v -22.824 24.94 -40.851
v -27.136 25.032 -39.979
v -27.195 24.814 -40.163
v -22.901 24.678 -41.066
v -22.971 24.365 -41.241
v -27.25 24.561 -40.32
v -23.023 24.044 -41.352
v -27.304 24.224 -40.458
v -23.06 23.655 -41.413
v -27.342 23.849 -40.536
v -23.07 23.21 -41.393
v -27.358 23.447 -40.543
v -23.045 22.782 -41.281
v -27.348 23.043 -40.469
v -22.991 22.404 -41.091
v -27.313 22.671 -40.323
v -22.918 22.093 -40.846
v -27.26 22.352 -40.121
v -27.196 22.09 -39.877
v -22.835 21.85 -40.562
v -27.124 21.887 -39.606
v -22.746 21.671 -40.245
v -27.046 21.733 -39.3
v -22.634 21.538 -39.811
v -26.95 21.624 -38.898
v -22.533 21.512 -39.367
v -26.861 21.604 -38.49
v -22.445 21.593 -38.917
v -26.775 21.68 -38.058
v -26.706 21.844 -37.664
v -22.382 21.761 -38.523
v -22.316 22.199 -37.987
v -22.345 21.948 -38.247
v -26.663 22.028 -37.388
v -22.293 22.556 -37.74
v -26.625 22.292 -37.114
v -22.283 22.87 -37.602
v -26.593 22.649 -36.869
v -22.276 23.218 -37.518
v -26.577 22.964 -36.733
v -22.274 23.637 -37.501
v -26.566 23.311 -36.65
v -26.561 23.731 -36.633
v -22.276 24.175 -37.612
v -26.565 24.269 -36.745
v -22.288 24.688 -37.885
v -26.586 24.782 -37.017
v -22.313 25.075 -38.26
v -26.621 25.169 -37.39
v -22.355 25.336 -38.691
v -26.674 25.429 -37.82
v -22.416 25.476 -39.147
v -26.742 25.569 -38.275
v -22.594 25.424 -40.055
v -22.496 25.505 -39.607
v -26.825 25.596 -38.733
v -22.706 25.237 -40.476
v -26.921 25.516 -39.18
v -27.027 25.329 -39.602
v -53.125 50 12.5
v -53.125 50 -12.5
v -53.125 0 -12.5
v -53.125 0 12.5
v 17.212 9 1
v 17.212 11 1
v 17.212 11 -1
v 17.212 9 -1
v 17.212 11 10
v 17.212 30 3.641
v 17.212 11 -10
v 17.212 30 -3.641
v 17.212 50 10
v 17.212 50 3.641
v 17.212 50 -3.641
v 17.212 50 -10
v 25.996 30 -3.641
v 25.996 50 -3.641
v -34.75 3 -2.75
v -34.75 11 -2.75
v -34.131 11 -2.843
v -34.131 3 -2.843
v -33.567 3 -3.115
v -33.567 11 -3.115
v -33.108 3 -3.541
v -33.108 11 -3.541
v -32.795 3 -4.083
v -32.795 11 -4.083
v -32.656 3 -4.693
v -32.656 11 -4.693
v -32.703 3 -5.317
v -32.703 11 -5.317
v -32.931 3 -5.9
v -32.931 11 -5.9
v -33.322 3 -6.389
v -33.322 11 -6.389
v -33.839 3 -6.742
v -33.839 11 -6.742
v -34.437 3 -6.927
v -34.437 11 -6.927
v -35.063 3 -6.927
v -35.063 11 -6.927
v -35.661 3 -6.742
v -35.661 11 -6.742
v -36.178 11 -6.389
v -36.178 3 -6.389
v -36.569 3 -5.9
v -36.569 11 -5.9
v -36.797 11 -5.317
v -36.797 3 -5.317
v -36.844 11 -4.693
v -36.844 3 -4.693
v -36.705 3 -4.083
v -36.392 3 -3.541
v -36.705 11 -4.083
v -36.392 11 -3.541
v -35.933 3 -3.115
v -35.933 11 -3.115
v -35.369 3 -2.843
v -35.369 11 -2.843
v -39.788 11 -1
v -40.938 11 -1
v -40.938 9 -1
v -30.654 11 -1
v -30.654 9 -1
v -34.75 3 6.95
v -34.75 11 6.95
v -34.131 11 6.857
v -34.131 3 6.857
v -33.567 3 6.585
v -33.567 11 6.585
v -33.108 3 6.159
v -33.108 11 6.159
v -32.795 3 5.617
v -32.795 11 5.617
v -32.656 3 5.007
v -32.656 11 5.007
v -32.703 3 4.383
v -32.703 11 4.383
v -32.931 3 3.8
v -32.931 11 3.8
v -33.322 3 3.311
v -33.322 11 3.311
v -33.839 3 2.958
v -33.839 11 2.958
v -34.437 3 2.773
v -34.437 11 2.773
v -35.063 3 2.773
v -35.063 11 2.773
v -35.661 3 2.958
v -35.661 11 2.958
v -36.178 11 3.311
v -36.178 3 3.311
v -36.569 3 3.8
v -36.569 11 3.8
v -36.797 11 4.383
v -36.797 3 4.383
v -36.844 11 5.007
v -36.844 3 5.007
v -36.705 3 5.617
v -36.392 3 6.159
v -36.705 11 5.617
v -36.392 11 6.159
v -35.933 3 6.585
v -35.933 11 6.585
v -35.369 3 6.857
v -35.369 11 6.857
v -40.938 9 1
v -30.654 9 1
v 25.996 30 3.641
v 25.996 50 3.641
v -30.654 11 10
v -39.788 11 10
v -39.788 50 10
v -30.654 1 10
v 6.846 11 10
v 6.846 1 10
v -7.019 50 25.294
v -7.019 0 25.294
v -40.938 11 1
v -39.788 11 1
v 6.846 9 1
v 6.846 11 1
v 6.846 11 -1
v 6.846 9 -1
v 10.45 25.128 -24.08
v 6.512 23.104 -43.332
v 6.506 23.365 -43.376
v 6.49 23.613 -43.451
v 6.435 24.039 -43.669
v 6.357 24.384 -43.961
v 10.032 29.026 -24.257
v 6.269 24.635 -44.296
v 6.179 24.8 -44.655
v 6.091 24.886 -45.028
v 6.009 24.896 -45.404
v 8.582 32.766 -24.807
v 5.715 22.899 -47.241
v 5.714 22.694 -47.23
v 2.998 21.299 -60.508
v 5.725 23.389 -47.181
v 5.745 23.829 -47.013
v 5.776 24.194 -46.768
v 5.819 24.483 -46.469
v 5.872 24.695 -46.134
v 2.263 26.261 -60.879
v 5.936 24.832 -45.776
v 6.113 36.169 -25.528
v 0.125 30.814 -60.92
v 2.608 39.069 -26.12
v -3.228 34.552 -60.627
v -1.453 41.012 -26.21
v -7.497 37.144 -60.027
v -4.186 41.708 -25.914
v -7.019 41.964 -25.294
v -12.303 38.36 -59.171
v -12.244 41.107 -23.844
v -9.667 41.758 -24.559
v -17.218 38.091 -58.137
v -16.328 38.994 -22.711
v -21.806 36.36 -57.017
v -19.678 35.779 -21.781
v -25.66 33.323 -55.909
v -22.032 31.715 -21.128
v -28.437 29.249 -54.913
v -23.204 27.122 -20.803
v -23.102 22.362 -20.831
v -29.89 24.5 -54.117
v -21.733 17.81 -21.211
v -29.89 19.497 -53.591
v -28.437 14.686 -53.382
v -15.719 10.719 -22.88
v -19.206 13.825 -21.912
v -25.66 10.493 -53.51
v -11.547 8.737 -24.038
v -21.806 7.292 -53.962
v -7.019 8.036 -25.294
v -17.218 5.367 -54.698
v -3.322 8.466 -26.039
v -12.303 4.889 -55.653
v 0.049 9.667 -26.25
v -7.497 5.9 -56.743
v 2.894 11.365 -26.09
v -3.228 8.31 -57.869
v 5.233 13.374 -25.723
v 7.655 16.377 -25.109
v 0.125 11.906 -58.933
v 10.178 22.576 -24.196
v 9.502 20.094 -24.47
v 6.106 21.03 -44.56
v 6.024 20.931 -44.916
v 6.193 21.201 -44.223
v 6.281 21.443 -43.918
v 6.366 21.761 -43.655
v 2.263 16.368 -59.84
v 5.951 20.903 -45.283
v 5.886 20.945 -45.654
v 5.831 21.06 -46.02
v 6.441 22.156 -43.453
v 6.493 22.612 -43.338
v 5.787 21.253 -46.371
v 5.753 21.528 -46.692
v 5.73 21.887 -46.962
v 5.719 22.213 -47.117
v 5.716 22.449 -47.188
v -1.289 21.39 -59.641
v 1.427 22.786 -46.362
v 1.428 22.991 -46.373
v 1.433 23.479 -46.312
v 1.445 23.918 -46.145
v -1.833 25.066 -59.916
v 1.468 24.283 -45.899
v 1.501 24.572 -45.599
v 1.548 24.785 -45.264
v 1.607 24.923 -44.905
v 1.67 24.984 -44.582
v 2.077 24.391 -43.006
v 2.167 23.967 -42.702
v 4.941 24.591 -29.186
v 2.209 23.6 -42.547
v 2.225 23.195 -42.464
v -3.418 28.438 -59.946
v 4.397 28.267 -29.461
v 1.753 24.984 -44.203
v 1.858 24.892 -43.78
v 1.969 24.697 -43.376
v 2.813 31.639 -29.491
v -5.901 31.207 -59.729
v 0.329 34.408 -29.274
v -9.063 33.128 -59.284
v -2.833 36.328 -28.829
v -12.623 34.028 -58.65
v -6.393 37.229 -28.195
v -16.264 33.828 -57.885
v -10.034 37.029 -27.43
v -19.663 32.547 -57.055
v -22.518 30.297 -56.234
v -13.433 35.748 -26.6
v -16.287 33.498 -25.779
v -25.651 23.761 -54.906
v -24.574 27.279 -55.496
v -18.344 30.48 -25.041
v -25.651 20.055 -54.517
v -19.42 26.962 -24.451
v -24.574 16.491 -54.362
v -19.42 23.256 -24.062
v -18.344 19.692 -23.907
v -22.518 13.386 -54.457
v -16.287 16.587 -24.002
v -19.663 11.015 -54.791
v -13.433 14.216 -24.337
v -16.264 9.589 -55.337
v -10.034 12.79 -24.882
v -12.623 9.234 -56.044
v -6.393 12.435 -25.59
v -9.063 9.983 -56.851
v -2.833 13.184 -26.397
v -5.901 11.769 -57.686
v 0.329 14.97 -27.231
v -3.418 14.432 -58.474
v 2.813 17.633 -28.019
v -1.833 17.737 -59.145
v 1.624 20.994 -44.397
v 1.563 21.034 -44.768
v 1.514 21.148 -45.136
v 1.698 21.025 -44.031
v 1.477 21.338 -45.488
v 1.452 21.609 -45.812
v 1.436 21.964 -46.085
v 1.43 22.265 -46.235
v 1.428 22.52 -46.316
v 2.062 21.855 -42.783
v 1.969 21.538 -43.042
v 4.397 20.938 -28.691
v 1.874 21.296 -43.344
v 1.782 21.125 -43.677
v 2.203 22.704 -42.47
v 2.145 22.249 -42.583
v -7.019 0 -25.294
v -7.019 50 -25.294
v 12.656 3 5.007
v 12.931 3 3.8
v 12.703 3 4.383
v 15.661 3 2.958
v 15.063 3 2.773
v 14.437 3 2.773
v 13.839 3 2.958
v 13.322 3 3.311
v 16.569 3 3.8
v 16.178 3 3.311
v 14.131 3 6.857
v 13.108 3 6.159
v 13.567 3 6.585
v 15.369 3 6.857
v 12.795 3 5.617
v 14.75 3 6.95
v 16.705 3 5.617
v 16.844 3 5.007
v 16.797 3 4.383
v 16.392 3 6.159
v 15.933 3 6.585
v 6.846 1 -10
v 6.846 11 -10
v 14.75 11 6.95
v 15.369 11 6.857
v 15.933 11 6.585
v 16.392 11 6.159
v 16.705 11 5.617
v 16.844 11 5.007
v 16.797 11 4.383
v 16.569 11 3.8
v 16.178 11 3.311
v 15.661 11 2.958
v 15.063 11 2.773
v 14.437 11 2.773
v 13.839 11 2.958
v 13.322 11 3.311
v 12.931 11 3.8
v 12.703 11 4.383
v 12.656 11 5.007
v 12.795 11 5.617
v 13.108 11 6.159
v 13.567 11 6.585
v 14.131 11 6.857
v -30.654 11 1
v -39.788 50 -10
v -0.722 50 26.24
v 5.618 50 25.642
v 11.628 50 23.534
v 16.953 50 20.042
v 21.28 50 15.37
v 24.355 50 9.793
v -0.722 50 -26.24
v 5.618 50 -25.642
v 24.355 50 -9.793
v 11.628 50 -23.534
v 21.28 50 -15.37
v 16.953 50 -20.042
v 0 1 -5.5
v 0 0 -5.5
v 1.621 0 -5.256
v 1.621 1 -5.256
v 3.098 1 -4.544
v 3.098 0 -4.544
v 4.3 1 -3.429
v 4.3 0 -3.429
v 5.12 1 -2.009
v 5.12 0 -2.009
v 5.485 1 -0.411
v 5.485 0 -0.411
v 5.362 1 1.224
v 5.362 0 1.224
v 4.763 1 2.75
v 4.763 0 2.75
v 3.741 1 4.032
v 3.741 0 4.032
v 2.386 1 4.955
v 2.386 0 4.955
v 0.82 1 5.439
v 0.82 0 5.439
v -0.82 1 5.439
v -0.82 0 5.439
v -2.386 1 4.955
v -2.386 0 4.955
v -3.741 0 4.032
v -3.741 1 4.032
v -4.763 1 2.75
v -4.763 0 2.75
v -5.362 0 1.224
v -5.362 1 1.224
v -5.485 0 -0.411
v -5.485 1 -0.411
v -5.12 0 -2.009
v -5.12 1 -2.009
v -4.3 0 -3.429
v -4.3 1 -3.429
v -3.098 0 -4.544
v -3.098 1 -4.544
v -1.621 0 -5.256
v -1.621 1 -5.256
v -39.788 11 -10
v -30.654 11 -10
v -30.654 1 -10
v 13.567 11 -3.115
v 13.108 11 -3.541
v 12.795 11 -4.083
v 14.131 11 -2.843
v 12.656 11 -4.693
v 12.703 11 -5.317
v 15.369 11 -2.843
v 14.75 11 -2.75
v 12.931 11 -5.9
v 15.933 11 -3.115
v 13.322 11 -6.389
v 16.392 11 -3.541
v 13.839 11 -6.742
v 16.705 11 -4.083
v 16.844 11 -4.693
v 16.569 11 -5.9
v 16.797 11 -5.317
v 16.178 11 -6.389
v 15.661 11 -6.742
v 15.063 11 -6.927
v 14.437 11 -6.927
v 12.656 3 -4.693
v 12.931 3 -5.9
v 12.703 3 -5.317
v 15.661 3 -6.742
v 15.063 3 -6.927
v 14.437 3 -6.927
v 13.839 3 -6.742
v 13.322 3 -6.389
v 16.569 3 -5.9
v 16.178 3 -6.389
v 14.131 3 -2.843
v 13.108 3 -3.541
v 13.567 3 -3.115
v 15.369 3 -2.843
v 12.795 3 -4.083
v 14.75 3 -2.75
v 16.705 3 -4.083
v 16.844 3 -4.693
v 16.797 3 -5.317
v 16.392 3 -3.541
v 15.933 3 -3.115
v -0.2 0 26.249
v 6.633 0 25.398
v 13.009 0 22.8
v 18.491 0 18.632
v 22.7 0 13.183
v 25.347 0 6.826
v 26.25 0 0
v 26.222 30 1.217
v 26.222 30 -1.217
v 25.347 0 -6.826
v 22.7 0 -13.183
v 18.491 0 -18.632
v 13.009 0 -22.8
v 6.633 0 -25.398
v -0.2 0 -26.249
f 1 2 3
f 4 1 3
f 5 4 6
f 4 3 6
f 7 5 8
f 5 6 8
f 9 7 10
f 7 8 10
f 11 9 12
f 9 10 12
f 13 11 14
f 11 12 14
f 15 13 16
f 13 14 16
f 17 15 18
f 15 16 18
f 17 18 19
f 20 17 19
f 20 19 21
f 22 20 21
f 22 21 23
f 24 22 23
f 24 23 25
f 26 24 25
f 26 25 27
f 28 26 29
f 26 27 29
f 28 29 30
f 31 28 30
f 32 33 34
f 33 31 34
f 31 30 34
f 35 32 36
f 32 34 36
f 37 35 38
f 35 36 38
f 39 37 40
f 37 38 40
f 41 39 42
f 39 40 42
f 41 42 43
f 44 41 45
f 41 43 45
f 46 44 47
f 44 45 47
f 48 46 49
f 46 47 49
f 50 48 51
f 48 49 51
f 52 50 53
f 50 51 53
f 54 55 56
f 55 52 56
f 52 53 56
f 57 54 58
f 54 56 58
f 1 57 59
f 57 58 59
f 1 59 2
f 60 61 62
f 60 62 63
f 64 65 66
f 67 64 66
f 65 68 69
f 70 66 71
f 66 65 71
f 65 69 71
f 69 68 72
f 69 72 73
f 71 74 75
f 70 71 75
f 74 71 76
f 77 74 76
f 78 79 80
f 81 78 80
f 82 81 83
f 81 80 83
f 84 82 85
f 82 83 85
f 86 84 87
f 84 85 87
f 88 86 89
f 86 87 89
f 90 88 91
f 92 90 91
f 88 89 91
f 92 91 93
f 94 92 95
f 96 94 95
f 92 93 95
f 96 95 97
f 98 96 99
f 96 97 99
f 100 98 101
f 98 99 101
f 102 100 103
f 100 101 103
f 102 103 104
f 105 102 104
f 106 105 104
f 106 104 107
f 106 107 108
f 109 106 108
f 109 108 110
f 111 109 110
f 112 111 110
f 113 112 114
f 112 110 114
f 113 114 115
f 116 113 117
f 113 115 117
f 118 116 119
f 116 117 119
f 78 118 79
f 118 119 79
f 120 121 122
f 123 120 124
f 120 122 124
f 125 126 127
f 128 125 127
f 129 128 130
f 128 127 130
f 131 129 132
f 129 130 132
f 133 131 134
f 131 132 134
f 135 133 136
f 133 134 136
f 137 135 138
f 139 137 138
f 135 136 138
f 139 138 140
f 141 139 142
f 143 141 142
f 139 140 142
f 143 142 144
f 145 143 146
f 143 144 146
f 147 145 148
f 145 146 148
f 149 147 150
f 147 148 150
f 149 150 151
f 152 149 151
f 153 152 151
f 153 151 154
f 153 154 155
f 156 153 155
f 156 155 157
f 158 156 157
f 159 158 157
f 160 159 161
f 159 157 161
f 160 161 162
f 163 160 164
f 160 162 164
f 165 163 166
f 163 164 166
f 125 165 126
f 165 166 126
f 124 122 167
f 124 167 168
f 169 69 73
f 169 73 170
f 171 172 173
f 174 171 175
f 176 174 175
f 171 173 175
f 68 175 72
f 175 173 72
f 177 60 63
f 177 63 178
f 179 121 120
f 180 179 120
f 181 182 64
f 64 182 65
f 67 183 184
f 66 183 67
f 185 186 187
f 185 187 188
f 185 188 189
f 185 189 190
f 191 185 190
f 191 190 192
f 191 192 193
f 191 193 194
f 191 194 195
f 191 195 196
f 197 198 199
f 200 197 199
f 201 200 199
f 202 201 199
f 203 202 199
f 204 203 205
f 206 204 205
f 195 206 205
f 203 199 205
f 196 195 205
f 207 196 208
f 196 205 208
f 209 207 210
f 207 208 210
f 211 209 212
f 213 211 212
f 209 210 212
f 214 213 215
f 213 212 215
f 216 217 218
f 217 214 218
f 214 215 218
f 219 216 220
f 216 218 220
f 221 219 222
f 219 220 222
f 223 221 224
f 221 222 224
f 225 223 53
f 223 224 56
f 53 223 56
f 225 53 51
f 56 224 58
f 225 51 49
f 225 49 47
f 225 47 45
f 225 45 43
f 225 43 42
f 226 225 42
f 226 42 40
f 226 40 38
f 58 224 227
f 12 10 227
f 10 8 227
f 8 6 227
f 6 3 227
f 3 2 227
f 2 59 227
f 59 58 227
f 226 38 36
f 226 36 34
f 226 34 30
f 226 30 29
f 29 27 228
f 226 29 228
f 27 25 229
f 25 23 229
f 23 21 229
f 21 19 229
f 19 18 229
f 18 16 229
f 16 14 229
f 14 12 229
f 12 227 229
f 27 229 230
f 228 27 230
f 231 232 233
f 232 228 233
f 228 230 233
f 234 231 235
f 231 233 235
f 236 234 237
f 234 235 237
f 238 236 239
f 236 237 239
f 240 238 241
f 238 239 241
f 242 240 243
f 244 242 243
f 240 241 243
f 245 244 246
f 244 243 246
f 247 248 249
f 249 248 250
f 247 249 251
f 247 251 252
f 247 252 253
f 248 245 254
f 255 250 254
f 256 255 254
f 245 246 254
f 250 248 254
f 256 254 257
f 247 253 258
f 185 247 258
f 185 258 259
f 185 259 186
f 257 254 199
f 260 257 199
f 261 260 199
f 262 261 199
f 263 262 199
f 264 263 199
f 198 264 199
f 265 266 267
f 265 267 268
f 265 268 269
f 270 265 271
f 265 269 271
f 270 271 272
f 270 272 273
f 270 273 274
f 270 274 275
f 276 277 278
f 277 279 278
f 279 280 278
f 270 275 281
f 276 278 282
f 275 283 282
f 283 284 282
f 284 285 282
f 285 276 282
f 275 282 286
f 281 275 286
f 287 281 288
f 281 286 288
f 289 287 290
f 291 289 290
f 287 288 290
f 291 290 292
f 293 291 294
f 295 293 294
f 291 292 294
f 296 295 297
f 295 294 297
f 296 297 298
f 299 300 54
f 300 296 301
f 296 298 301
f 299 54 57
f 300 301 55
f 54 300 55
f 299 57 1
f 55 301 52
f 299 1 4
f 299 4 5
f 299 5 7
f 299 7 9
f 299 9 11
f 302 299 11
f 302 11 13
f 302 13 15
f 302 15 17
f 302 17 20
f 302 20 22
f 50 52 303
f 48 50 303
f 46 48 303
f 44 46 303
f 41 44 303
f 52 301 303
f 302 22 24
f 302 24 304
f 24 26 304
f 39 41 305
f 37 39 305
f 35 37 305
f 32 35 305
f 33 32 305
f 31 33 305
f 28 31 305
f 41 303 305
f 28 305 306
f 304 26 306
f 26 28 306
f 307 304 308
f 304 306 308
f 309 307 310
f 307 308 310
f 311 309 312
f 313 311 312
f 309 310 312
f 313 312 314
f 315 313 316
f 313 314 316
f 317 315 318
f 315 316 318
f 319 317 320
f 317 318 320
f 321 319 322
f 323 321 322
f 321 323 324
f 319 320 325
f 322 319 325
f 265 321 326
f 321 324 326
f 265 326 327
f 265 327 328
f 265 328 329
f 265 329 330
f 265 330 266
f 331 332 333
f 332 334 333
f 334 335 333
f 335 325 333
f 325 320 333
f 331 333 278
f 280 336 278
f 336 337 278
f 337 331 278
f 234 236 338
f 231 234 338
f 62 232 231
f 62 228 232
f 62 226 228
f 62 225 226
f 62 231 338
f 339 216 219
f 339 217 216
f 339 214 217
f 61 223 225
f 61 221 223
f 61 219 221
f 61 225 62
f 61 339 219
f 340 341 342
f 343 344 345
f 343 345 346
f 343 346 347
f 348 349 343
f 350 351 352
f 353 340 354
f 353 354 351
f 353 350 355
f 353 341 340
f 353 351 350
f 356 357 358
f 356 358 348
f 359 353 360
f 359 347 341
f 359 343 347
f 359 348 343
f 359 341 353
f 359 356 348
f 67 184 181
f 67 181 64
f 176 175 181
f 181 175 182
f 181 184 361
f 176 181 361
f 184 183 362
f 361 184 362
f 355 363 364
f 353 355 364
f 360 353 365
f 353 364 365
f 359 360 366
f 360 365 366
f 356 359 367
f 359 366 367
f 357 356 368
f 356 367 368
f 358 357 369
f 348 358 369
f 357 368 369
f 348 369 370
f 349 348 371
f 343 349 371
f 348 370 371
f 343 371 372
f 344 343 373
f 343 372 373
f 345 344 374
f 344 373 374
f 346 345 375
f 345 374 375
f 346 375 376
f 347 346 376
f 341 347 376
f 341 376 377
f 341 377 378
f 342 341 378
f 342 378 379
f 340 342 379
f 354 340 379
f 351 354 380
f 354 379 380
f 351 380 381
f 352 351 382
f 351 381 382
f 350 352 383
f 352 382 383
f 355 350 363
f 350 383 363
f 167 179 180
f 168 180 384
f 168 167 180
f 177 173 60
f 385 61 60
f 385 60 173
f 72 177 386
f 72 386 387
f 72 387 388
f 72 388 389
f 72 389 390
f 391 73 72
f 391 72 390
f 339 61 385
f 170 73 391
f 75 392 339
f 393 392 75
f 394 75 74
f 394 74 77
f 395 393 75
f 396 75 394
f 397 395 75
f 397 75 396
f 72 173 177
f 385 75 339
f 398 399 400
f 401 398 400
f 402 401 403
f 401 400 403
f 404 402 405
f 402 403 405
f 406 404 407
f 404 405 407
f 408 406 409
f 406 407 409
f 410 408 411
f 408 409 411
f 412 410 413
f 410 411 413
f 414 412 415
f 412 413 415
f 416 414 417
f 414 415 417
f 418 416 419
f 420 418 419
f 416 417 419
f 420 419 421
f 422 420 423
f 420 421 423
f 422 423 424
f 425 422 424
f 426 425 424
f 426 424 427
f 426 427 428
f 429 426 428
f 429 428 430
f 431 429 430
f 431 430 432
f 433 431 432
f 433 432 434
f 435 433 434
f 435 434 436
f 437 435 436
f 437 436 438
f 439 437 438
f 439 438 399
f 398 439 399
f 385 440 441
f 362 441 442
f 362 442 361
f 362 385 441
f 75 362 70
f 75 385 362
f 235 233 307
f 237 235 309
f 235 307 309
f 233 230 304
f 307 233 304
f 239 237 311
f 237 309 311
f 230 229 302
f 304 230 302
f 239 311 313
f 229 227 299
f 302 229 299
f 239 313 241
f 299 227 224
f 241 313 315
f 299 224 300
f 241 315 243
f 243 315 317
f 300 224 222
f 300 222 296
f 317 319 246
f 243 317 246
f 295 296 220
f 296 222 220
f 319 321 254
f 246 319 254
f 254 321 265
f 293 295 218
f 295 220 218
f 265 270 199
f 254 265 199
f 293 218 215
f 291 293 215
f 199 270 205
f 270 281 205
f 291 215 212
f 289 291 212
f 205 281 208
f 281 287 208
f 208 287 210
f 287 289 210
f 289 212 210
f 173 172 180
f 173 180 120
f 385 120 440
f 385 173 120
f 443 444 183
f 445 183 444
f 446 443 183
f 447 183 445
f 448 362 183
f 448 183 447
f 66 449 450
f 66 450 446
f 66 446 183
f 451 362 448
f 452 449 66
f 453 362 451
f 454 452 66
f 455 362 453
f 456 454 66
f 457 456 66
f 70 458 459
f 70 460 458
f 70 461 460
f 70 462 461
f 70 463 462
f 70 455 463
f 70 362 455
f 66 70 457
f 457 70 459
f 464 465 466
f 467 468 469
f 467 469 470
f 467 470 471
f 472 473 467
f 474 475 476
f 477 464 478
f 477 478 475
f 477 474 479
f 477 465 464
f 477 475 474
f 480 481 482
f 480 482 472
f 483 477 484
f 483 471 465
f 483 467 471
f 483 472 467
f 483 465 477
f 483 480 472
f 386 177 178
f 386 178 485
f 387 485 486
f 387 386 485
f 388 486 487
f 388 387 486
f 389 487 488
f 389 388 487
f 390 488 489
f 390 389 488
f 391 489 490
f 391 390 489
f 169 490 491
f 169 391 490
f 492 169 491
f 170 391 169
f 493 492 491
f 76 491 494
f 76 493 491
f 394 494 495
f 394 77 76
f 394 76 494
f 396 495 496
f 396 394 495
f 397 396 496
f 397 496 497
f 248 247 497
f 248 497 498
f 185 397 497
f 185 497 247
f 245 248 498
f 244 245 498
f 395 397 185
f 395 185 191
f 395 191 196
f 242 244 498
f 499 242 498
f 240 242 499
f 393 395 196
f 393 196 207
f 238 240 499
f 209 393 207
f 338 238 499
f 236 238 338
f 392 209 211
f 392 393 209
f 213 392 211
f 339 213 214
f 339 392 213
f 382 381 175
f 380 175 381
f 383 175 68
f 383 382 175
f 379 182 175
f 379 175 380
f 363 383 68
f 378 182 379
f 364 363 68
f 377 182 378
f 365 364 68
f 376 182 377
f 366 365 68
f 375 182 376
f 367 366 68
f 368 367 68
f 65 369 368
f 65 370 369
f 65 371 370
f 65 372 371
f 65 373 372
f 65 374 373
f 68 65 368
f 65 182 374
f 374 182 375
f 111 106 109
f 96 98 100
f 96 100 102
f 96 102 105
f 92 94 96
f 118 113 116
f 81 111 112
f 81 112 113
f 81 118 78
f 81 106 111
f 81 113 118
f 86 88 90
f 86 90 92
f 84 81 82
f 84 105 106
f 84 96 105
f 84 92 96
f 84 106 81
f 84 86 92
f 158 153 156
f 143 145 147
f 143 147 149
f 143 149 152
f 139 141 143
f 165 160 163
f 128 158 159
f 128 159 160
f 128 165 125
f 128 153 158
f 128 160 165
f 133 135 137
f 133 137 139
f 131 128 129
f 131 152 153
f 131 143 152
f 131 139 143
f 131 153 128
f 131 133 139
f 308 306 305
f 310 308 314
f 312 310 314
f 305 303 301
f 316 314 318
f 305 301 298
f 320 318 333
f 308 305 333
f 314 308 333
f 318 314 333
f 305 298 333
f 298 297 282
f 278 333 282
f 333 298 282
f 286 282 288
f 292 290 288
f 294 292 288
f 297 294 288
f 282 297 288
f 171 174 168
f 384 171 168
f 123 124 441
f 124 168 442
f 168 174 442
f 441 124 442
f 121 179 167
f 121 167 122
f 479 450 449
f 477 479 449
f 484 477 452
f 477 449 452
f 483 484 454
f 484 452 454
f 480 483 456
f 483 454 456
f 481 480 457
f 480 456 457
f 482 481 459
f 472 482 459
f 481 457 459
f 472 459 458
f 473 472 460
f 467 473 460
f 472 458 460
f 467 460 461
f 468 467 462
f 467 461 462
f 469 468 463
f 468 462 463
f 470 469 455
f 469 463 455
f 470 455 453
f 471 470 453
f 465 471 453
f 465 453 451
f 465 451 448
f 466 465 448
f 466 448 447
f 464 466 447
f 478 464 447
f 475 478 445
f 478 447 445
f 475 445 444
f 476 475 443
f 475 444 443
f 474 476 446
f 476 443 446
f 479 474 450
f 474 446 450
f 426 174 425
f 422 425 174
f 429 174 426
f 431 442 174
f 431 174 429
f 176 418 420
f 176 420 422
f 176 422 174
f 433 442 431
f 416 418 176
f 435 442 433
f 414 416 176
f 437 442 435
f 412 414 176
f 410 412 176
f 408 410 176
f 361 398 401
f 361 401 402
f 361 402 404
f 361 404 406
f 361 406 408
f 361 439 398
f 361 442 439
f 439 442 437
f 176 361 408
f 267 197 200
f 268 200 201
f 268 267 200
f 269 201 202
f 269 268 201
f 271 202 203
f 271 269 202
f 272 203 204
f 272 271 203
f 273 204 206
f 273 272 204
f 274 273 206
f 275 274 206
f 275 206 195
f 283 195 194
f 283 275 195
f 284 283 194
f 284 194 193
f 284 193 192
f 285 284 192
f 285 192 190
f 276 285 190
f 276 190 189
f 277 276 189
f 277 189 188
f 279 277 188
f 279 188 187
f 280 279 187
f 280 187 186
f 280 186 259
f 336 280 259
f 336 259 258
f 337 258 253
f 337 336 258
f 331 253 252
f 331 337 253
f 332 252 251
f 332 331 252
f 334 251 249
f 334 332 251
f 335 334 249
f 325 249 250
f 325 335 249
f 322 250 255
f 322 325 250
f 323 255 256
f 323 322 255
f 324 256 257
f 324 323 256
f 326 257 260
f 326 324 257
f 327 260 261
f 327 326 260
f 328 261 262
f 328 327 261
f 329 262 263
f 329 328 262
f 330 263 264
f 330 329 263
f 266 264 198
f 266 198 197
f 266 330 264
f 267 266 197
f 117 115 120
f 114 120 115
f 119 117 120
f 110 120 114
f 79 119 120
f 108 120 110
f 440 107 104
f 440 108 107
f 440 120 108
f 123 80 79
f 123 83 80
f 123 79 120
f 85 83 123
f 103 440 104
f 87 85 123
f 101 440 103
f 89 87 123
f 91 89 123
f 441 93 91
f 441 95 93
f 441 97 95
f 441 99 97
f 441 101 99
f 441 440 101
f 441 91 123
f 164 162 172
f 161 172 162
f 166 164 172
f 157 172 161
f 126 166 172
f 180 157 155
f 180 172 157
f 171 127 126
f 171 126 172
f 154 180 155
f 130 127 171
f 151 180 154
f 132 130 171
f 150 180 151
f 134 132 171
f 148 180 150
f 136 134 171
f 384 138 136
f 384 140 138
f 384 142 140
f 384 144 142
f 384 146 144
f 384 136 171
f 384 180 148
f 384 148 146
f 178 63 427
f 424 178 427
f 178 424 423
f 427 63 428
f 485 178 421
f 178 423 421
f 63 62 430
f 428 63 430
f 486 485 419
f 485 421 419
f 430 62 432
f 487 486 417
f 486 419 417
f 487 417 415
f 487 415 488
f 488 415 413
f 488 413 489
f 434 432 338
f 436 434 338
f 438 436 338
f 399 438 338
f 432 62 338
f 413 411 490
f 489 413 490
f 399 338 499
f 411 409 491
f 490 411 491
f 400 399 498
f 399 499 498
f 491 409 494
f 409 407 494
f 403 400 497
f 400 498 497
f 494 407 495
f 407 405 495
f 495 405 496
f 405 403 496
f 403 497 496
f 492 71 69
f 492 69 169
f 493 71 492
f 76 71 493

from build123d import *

# Parameters (mm, degrees)
BOSS_EXTRUDE1_DEPTH       = 40
REVOLVE1_START            = -44.95139953
REVOLVE1_OUTLINE_R        = 13.5
REVOLVE1_DEPTH            = 30.829897511
M18_CLEARANCE_HOLE1_D     = 20
M18_CLEARANCE_HOLE1_DEPTH = 25
SKETCH9_W                 = 1.6
SKETCH9_H                 = 27
CUT_EXTRUDE4_DEPTH        = 76.299241718
CUT_EXTRUDE4_DEPTH_BACK   = 76.299241718
SKETCH18_R                = 1.6
SCALE2_SCALE              = 1.25
SKETCH19_W                = 57
SKETCH19_H                = 20
CUT_EXTRUDE5_DEPTH        = 39
SKETCH20_W                = 40
SKETCH20_H                = 20
CUT_EXTRUDE6_DEPTH        = 10
SKETCH21_R                = 5.5
CUT_EXTRUDE7_DEPTH        = 96.0605556
SKETCH22_W                = 7.783449774
SKETCH22_H                = 2
SKETCH22_W_2              = 10.366550226
CUT_EXTRUDE8_DEPTH        = 2
SKETCH23_W                = 9.71853625
SKETCH23_H                = 7.281011564
CUT_EXTRUDE9_DEPTH        = 20
SKETCH25_W                = 2.5
SKETCH25_H                = 9
BOSS_EXTRUDE3_DEPTH       = 10
SKETCH26_W                = 2.5
SKETCH26_H                = 2
BOSS_EXTRUDE4_DEPTH       = 8
SKETCH27_R                = 2.1
CUT_EXTRUDE10_DEPTH       = 8


with BuildPart() as part:
    # Sketch1 → Boss-Extrude1 (new body)
    with BuildSketch(Plane(origin=(0, 40, 0), x_dir=(1, 0, 0), z_dir=(0, 1, 0))):
        with BuildLine():
            Line((-5.61521172, 20.235350191), (-42.5, 10))
            Line((-42.5, 10), (-42.5, -10))
            Line((-42.5, -10), (-5.61521172, -20.235350191))
            ThreePointArc((-5.61521172, -20.235350191), (21, 0), (-5.61521172, 20.235350191))
        make_face()
    extrude(amount=-BOSS_EXTRUDE1_DEPTH)

    # Revolve1: read off the stored shape, not the designer's step
    # Revolve1 outline → Revolve1 (add)
    with BuildSketch(Plane(origin=(0, 0, 0), x_dir=(0.9799247046208294, -0.02083962380947531, -0.19827577601224947), z_dir=(0.19936793441719802, 0.10243002349202102, 0.9745565745577031)).offset(REVOLVE1_START)):
        with Locations((-1.9070974, 22.005607966)):
            Circle(REVOLVE1_OUTLINE_R)
    extrude(amount=REVOLVE1_DEPTH)

    # M18 Clearance Hole1
    with Locations(Plane(origin=(-8.961867673, -4.60437291, -43.807681948), x_dir=(-0.9799247046208296, 0.02083962380947534, 0.19827577601224922), z_dir=(-0.19936793441719777, -0.10243002349202121, -0.9745565745577032))):
        with Locations((1.9070974, 22.005607966)):
            Hole(M18_CLEARANCE_HOLE1_D / 2, depth=M18_CLEARANCE_HOLE1_DEPTH)

    # Sketch9 → M3.5 Clearance Hole1 (revolve, cut)
    with BuildSketch(Plane(origin=(-18.009225855, 18.806465846, -31.591069121), x_dir=(-0.12392681772022805, 0.7153744254872676, -0.6876638533531477), z_dir=(0.1561720753640579, 0.6984304843277114, 0.6984304843277114))):
        with Locations((0.8, 13.5)):
            Rectangle(SKETCH9_W, SKETCH9_H)
    revolve(axis=Axis((-11.78670398, 18.674134235, -32.850120299), (-0.9799247046208297, 0.020839623809475325, 0.19827577601224802)), mode=Mode.SUBTRACT)

    # Sketch18 → Cut-Extrude4 (cut, two sides: drawn at the far end of the back side and taken through both)
    with BuildSketch(Plane(origin=(-1.740210315, 0.03700828, 0.352110268), x_dir=(-0.19823095447813932, 0.004215689735382395, -0.9801462730872066), z_dir=(0.9799247046208297, -0.020839623809475356, -0.19827577601224802)).offset(-CUT_EXTRUDE4_DEPTH_BACK)):
        with Locations(Location((34.613136918, 18.419306886, 0), (0, 0, 359.758405588))):
            Circle(SKETCH18_R)
    extrude(amount=CUT_EXTRUDE4_DEPTH + CUT_EXTRUDE4_DEPTH_BACK, mode=Mode.SUBTRACT)


with BuildPart() as part_1:
    # Scale2: scaled about (0, 0, 0)
    add(part.part.scale(SCALE2_SCALE))

    # Sketch19 → Cut-Extrude5 (cut)
    with BuildSketch(Plane(origin=(0, 50, 0), x_dir=(1, 0, 0), z_dir=(0, 1, 0))):
        with Locations((-11.2875, 0)):
            Rectangle(SKETCH19_W, SKETCH19_H)
    extrude(amount=-CUT_EXTRUDE5_DEPTH, mode=Mode.SUBTRACT)

    # Sketch20 → Cut-Extrude6 (cut)
    with BuildSketch(Plane(origin=(0, 11, 0), x_dir=(1, 0, 0), z_dir=(0, 1, 0))):
        with Locations((-13.154050226, 0)):
            Rectangle(SKETCH20_W, SKETCH20_H)
    extrude(amount=-CUT_EXTRUDE6_DEPTH, mode=Mode.SUBTRACT)

    # Sketch21 → Cut-Extrude7 (cut, through all)
    with BuildSketch(Plane.XZ):
        with Locations(Location((0, 0, 0), (0, 0, 270))):
            Circle(SKETCH21_R)
    extrude(amount=-CUT_EXTRUDE7_DEPTH, mode=Mode.SUBTRACT)

    # Sketch22 → Cut-Extrude8 (cut)
    with BuildSketch(Plane(origin=(0, 11, 0), x_dir=(1, 0, 0), z_dir=(0, 1, 0))):
        with Locations((-37.045775113, 0)):
            Rectangle(SKETCH22_W, SKETCH22_H)
        with Locations((12.029224887, 0)):
            Rectangle(SKETCH22_W_2, SKETCH22_H)
    extrude(amount=-CUT_EXTRUDE8_DEPTH, mode=Mode.SUBTRACT)

    # Sketch23 → Cut-Extrude9 (cut)
    with BuildSketch(Plane(origin=(0, 50, 0), x_dir=(1, 0, 0), z_dir=(0, 1, 0))):
        with Locations((22.071768125, 0)):
            Rectangle(SKETCH23_W, SKETCH23_H)
    extrude(amount=-CUT_EXTRUDE9_DEPTH, mode=Mode.SUBTRACT)

    # Sketch25 → Boss-Extrude3 (add)
    with BuildSketch(Plane(origin=(0, 1, 0), x_dir=(1, 0, 0), z_dir=(0, 1, 0))):
        with Locations((-31.904050226, 5.5)):
            Rectangle(SKETCH25_W, SKETCH25_H)
        with Locations((-31.904050226, -5.5)):
            Rectangle(SKETCH25_W, SKETCH25_H)
    extrude(amount=BOSS_EXTRUDE3_DEPTH)

    # Sketch26 → Boss-Extrude4 (add)
    with BuildSketch(Plane(origin=(0, 1, 0), x_dir=(1, 0, 0), z_dir=(0, 1, 0))):
        with Locations((-31.904050226, 0)):
            Rectangle(SKETCH26_W, SKETCH26_H)
    extrude(amount=BOSS_EXTRUDE4_DEPTH)

    # Sketch27 → Cut-Extrude10 (cut)
    with BuildSketch(Plane(origin=(0, 11, 0), x_dir=(1, 0, 0), z_dir=(0, 1, 0))):
        with Locations(Location((14.75, 4.85, 0), (0, 0, 270))):
            Circle(SKETCH27_R)
        with Locations(Location((14.75, -4.85, 0), (0, 0, 270))):
            Circle(SKETCH27_R)
        with Locations(Location((-34.75, 4.85, 0), (0, 0, 270))):
            Circle(SKETCH27_R)
        with Locations(Location((-34.75, -4.85, 0), (0, 0, 270))):
            Circle(SKETCH27_R)
    extrude(amount=-CUT_EXTRUDE10_DEPTH, mode=Mode.SUBTRACT)


solid = part_1.part
